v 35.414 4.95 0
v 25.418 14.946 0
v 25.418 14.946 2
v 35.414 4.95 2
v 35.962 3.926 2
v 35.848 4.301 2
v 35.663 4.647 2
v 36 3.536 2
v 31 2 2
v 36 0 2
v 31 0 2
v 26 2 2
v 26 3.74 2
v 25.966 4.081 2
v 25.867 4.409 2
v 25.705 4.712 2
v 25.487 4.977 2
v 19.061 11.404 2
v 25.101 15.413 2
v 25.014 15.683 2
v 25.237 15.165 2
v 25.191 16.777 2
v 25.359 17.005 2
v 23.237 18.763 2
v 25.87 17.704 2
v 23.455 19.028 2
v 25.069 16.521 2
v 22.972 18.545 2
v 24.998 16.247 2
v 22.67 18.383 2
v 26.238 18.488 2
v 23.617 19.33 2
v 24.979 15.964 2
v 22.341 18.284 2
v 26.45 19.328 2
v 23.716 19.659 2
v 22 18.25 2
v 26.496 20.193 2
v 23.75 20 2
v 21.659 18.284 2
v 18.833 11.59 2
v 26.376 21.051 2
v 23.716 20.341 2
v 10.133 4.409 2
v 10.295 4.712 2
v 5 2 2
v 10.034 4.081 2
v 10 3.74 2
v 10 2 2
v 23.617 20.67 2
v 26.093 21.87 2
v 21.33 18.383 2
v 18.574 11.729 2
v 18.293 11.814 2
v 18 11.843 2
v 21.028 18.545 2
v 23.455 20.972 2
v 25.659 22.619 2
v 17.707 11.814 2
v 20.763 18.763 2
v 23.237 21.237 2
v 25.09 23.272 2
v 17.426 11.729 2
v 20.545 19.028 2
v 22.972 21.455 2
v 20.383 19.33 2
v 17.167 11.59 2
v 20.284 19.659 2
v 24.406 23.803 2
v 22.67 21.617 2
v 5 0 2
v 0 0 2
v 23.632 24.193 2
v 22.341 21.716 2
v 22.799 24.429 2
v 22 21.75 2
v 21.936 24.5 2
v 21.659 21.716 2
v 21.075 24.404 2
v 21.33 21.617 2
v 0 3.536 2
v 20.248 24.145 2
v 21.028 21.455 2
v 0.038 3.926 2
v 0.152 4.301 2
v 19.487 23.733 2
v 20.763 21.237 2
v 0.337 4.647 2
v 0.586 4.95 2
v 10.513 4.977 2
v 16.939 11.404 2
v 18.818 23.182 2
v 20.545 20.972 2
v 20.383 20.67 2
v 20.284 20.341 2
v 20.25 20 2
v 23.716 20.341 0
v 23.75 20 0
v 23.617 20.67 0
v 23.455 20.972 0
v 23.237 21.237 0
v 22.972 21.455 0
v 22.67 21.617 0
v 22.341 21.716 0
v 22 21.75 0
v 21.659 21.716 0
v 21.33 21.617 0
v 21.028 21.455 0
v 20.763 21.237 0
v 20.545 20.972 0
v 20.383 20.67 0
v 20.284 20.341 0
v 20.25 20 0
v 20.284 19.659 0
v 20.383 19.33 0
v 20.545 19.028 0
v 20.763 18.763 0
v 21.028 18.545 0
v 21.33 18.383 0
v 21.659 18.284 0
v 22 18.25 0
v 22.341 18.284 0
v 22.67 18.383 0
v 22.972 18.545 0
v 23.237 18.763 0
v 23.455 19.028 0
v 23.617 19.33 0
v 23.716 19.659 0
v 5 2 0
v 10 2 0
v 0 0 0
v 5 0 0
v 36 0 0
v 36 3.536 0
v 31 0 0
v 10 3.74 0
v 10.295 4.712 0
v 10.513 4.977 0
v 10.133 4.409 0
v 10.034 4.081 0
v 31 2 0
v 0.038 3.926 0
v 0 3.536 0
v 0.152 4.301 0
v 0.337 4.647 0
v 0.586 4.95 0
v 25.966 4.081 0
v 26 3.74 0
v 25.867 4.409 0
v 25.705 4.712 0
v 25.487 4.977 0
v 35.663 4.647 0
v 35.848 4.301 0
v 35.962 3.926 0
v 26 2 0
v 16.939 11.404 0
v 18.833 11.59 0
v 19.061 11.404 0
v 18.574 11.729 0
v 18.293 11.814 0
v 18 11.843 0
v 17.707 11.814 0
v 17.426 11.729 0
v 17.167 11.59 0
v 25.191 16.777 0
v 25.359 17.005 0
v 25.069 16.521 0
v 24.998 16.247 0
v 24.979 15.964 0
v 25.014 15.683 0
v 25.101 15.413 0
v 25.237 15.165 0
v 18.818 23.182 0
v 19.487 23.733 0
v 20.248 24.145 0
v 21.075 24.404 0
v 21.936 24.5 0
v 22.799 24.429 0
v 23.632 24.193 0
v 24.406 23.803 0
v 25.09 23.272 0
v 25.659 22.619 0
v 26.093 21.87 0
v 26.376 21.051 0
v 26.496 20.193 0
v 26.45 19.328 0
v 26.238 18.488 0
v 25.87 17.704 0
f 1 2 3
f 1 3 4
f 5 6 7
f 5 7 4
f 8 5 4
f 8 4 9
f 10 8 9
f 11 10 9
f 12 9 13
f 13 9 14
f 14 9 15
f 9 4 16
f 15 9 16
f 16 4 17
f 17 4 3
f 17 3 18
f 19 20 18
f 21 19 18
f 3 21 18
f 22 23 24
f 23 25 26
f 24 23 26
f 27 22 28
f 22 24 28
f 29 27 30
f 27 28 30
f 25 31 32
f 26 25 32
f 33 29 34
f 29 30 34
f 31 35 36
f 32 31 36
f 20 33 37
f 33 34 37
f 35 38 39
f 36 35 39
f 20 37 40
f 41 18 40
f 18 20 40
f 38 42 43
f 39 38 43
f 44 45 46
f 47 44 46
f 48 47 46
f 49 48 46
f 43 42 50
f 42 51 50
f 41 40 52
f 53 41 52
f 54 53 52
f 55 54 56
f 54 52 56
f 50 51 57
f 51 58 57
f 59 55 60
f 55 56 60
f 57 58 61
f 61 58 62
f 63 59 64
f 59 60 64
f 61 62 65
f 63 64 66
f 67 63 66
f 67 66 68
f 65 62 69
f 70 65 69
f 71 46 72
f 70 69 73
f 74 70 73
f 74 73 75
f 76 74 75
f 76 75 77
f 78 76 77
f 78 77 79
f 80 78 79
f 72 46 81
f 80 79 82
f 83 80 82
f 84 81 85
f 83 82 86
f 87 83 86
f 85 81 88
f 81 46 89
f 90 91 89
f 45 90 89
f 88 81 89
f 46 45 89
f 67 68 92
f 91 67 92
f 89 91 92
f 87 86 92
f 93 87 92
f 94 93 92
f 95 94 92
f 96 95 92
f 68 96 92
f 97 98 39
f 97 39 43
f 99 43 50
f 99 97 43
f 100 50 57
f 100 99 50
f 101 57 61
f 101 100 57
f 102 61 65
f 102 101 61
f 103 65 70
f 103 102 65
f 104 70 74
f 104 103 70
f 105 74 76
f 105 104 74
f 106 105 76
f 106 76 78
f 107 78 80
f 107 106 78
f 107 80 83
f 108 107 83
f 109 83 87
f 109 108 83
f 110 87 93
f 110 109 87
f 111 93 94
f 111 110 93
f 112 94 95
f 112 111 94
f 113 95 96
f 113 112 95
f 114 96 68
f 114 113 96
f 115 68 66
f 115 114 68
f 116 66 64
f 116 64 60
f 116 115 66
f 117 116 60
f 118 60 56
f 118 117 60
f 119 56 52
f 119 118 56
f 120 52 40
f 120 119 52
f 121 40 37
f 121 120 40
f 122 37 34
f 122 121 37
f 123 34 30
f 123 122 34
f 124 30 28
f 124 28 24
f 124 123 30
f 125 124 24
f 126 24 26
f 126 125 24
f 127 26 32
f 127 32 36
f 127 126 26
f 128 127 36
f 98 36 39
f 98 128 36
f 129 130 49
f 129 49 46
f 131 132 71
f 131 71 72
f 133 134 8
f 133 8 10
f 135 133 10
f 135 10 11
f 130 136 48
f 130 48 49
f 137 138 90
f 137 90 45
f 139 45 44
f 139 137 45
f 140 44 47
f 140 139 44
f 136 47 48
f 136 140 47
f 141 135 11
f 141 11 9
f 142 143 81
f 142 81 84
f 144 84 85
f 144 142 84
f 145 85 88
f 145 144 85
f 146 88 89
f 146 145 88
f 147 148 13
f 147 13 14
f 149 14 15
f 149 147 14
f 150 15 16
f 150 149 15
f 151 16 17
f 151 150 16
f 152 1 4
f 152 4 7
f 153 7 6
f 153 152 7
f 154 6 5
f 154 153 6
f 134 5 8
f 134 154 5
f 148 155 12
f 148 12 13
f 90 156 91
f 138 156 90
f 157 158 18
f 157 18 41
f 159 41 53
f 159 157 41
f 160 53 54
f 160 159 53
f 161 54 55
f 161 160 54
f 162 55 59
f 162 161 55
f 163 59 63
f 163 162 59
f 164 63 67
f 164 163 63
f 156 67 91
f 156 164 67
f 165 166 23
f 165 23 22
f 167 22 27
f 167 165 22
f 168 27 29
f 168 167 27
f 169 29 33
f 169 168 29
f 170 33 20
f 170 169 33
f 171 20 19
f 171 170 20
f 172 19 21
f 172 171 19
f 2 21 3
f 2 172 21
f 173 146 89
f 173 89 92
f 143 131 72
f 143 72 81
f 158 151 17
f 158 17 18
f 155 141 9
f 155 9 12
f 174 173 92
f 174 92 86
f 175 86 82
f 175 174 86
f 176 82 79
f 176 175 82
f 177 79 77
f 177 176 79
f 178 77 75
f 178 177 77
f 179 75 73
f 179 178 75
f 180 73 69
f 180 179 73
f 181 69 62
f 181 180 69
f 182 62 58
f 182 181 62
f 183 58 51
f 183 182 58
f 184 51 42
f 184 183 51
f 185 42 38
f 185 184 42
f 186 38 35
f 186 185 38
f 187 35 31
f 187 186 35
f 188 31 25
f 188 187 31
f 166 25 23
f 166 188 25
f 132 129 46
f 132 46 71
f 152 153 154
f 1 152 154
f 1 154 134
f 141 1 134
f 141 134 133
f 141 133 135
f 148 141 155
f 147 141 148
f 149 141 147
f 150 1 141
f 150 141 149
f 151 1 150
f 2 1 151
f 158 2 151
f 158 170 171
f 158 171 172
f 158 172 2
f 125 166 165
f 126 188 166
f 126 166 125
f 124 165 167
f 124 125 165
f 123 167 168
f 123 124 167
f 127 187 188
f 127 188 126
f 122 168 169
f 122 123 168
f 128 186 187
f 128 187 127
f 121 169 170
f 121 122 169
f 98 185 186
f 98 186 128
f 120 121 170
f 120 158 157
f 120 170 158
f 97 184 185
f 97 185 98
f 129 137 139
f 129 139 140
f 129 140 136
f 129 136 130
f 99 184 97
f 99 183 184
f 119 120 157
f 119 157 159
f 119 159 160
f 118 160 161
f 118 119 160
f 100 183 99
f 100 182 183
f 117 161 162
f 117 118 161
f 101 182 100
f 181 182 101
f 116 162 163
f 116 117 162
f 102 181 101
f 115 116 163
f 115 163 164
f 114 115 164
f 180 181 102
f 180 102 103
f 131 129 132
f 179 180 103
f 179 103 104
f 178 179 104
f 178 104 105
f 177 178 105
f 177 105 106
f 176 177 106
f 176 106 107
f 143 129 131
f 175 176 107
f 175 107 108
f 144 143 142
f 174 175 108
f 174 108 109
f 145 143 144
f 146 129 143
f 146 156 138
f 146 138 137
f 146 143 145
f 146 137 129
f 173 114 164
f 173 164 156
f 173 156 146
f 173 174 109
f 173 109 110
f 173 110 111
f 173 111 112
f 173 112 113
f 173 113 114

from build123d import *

# Parameters (mm, degrees)
SKETCH1_R           = 1.75
BOSS_EXTRUDE1_DEPTH = 2


with BuildPart() as part:
    # Sketch1 → Boss-Extrude1 (new body)
    with BuildSketch(Plane.XY):
        with BuildLine():
            Line((0, 0), (0, 3.535533906))
            ThreePointArc((0, 3.535533906), (0.152240935, 4.300900771), (0.585786438, 4.949747468))
            Line((0.585786438, 4.949747468), (18.818019485, 23.181980515))
            ThreePointArc((18.818019485, 23.181980515), (25.089650716, 23.271705741), (25.358752948, 17.005208082))
            ThreePointArc((25.358752948, 17.005208082), (24.978951169, 15.964033329), (25.417677093, 14.946283938))
            Line((25.417677093, 14.946283938), (35.414213562, 4.949747468))
            ThreePointArc((35.414213562, 4.949747468), (35.847759065, 4.300900771), (36, 3.535533906))
            Line((36, 3.535533906), (36, 0))
            Line((36, 0), (31, 0))
            Line((31, 0), (31, 2))
            Line((31, 2), (26, 2))
            Line((26, 2), (26, 3.73959236))
            ThreePointArc((26, 3.73959236), (25.866789182, 4.409288367), (25.487436867, 4.977029227))
            Line((25.487436867, 4.977029227), (19.060660172, 11.403805922))
            ThreePointArc((19.060660172, 11.403805922), (18, 11.843145751), (16.939339828, 11.403805922))
            Line((16.939339828, 11.403805922), (10.512563133, 4.977029227))
            ThreePointArc((10.512563133, 4.977029227), (10.133210818, 4.409288367), (10, 3.73959236))
            Line((10, 3.73959236), (10, 2))
            Line((10, 2), (5, 2))
            Line((5, 2), (5, 0))
            Line((5, 0), (0, 0))
        make_face()
        with Locations((22, 20)):
            Circle(SKETCH1_R, mode=Mode.SUBTRACT)
    extrude(amount=BOSS_EXTRUDE1_DEPTH)


solid = part.part
